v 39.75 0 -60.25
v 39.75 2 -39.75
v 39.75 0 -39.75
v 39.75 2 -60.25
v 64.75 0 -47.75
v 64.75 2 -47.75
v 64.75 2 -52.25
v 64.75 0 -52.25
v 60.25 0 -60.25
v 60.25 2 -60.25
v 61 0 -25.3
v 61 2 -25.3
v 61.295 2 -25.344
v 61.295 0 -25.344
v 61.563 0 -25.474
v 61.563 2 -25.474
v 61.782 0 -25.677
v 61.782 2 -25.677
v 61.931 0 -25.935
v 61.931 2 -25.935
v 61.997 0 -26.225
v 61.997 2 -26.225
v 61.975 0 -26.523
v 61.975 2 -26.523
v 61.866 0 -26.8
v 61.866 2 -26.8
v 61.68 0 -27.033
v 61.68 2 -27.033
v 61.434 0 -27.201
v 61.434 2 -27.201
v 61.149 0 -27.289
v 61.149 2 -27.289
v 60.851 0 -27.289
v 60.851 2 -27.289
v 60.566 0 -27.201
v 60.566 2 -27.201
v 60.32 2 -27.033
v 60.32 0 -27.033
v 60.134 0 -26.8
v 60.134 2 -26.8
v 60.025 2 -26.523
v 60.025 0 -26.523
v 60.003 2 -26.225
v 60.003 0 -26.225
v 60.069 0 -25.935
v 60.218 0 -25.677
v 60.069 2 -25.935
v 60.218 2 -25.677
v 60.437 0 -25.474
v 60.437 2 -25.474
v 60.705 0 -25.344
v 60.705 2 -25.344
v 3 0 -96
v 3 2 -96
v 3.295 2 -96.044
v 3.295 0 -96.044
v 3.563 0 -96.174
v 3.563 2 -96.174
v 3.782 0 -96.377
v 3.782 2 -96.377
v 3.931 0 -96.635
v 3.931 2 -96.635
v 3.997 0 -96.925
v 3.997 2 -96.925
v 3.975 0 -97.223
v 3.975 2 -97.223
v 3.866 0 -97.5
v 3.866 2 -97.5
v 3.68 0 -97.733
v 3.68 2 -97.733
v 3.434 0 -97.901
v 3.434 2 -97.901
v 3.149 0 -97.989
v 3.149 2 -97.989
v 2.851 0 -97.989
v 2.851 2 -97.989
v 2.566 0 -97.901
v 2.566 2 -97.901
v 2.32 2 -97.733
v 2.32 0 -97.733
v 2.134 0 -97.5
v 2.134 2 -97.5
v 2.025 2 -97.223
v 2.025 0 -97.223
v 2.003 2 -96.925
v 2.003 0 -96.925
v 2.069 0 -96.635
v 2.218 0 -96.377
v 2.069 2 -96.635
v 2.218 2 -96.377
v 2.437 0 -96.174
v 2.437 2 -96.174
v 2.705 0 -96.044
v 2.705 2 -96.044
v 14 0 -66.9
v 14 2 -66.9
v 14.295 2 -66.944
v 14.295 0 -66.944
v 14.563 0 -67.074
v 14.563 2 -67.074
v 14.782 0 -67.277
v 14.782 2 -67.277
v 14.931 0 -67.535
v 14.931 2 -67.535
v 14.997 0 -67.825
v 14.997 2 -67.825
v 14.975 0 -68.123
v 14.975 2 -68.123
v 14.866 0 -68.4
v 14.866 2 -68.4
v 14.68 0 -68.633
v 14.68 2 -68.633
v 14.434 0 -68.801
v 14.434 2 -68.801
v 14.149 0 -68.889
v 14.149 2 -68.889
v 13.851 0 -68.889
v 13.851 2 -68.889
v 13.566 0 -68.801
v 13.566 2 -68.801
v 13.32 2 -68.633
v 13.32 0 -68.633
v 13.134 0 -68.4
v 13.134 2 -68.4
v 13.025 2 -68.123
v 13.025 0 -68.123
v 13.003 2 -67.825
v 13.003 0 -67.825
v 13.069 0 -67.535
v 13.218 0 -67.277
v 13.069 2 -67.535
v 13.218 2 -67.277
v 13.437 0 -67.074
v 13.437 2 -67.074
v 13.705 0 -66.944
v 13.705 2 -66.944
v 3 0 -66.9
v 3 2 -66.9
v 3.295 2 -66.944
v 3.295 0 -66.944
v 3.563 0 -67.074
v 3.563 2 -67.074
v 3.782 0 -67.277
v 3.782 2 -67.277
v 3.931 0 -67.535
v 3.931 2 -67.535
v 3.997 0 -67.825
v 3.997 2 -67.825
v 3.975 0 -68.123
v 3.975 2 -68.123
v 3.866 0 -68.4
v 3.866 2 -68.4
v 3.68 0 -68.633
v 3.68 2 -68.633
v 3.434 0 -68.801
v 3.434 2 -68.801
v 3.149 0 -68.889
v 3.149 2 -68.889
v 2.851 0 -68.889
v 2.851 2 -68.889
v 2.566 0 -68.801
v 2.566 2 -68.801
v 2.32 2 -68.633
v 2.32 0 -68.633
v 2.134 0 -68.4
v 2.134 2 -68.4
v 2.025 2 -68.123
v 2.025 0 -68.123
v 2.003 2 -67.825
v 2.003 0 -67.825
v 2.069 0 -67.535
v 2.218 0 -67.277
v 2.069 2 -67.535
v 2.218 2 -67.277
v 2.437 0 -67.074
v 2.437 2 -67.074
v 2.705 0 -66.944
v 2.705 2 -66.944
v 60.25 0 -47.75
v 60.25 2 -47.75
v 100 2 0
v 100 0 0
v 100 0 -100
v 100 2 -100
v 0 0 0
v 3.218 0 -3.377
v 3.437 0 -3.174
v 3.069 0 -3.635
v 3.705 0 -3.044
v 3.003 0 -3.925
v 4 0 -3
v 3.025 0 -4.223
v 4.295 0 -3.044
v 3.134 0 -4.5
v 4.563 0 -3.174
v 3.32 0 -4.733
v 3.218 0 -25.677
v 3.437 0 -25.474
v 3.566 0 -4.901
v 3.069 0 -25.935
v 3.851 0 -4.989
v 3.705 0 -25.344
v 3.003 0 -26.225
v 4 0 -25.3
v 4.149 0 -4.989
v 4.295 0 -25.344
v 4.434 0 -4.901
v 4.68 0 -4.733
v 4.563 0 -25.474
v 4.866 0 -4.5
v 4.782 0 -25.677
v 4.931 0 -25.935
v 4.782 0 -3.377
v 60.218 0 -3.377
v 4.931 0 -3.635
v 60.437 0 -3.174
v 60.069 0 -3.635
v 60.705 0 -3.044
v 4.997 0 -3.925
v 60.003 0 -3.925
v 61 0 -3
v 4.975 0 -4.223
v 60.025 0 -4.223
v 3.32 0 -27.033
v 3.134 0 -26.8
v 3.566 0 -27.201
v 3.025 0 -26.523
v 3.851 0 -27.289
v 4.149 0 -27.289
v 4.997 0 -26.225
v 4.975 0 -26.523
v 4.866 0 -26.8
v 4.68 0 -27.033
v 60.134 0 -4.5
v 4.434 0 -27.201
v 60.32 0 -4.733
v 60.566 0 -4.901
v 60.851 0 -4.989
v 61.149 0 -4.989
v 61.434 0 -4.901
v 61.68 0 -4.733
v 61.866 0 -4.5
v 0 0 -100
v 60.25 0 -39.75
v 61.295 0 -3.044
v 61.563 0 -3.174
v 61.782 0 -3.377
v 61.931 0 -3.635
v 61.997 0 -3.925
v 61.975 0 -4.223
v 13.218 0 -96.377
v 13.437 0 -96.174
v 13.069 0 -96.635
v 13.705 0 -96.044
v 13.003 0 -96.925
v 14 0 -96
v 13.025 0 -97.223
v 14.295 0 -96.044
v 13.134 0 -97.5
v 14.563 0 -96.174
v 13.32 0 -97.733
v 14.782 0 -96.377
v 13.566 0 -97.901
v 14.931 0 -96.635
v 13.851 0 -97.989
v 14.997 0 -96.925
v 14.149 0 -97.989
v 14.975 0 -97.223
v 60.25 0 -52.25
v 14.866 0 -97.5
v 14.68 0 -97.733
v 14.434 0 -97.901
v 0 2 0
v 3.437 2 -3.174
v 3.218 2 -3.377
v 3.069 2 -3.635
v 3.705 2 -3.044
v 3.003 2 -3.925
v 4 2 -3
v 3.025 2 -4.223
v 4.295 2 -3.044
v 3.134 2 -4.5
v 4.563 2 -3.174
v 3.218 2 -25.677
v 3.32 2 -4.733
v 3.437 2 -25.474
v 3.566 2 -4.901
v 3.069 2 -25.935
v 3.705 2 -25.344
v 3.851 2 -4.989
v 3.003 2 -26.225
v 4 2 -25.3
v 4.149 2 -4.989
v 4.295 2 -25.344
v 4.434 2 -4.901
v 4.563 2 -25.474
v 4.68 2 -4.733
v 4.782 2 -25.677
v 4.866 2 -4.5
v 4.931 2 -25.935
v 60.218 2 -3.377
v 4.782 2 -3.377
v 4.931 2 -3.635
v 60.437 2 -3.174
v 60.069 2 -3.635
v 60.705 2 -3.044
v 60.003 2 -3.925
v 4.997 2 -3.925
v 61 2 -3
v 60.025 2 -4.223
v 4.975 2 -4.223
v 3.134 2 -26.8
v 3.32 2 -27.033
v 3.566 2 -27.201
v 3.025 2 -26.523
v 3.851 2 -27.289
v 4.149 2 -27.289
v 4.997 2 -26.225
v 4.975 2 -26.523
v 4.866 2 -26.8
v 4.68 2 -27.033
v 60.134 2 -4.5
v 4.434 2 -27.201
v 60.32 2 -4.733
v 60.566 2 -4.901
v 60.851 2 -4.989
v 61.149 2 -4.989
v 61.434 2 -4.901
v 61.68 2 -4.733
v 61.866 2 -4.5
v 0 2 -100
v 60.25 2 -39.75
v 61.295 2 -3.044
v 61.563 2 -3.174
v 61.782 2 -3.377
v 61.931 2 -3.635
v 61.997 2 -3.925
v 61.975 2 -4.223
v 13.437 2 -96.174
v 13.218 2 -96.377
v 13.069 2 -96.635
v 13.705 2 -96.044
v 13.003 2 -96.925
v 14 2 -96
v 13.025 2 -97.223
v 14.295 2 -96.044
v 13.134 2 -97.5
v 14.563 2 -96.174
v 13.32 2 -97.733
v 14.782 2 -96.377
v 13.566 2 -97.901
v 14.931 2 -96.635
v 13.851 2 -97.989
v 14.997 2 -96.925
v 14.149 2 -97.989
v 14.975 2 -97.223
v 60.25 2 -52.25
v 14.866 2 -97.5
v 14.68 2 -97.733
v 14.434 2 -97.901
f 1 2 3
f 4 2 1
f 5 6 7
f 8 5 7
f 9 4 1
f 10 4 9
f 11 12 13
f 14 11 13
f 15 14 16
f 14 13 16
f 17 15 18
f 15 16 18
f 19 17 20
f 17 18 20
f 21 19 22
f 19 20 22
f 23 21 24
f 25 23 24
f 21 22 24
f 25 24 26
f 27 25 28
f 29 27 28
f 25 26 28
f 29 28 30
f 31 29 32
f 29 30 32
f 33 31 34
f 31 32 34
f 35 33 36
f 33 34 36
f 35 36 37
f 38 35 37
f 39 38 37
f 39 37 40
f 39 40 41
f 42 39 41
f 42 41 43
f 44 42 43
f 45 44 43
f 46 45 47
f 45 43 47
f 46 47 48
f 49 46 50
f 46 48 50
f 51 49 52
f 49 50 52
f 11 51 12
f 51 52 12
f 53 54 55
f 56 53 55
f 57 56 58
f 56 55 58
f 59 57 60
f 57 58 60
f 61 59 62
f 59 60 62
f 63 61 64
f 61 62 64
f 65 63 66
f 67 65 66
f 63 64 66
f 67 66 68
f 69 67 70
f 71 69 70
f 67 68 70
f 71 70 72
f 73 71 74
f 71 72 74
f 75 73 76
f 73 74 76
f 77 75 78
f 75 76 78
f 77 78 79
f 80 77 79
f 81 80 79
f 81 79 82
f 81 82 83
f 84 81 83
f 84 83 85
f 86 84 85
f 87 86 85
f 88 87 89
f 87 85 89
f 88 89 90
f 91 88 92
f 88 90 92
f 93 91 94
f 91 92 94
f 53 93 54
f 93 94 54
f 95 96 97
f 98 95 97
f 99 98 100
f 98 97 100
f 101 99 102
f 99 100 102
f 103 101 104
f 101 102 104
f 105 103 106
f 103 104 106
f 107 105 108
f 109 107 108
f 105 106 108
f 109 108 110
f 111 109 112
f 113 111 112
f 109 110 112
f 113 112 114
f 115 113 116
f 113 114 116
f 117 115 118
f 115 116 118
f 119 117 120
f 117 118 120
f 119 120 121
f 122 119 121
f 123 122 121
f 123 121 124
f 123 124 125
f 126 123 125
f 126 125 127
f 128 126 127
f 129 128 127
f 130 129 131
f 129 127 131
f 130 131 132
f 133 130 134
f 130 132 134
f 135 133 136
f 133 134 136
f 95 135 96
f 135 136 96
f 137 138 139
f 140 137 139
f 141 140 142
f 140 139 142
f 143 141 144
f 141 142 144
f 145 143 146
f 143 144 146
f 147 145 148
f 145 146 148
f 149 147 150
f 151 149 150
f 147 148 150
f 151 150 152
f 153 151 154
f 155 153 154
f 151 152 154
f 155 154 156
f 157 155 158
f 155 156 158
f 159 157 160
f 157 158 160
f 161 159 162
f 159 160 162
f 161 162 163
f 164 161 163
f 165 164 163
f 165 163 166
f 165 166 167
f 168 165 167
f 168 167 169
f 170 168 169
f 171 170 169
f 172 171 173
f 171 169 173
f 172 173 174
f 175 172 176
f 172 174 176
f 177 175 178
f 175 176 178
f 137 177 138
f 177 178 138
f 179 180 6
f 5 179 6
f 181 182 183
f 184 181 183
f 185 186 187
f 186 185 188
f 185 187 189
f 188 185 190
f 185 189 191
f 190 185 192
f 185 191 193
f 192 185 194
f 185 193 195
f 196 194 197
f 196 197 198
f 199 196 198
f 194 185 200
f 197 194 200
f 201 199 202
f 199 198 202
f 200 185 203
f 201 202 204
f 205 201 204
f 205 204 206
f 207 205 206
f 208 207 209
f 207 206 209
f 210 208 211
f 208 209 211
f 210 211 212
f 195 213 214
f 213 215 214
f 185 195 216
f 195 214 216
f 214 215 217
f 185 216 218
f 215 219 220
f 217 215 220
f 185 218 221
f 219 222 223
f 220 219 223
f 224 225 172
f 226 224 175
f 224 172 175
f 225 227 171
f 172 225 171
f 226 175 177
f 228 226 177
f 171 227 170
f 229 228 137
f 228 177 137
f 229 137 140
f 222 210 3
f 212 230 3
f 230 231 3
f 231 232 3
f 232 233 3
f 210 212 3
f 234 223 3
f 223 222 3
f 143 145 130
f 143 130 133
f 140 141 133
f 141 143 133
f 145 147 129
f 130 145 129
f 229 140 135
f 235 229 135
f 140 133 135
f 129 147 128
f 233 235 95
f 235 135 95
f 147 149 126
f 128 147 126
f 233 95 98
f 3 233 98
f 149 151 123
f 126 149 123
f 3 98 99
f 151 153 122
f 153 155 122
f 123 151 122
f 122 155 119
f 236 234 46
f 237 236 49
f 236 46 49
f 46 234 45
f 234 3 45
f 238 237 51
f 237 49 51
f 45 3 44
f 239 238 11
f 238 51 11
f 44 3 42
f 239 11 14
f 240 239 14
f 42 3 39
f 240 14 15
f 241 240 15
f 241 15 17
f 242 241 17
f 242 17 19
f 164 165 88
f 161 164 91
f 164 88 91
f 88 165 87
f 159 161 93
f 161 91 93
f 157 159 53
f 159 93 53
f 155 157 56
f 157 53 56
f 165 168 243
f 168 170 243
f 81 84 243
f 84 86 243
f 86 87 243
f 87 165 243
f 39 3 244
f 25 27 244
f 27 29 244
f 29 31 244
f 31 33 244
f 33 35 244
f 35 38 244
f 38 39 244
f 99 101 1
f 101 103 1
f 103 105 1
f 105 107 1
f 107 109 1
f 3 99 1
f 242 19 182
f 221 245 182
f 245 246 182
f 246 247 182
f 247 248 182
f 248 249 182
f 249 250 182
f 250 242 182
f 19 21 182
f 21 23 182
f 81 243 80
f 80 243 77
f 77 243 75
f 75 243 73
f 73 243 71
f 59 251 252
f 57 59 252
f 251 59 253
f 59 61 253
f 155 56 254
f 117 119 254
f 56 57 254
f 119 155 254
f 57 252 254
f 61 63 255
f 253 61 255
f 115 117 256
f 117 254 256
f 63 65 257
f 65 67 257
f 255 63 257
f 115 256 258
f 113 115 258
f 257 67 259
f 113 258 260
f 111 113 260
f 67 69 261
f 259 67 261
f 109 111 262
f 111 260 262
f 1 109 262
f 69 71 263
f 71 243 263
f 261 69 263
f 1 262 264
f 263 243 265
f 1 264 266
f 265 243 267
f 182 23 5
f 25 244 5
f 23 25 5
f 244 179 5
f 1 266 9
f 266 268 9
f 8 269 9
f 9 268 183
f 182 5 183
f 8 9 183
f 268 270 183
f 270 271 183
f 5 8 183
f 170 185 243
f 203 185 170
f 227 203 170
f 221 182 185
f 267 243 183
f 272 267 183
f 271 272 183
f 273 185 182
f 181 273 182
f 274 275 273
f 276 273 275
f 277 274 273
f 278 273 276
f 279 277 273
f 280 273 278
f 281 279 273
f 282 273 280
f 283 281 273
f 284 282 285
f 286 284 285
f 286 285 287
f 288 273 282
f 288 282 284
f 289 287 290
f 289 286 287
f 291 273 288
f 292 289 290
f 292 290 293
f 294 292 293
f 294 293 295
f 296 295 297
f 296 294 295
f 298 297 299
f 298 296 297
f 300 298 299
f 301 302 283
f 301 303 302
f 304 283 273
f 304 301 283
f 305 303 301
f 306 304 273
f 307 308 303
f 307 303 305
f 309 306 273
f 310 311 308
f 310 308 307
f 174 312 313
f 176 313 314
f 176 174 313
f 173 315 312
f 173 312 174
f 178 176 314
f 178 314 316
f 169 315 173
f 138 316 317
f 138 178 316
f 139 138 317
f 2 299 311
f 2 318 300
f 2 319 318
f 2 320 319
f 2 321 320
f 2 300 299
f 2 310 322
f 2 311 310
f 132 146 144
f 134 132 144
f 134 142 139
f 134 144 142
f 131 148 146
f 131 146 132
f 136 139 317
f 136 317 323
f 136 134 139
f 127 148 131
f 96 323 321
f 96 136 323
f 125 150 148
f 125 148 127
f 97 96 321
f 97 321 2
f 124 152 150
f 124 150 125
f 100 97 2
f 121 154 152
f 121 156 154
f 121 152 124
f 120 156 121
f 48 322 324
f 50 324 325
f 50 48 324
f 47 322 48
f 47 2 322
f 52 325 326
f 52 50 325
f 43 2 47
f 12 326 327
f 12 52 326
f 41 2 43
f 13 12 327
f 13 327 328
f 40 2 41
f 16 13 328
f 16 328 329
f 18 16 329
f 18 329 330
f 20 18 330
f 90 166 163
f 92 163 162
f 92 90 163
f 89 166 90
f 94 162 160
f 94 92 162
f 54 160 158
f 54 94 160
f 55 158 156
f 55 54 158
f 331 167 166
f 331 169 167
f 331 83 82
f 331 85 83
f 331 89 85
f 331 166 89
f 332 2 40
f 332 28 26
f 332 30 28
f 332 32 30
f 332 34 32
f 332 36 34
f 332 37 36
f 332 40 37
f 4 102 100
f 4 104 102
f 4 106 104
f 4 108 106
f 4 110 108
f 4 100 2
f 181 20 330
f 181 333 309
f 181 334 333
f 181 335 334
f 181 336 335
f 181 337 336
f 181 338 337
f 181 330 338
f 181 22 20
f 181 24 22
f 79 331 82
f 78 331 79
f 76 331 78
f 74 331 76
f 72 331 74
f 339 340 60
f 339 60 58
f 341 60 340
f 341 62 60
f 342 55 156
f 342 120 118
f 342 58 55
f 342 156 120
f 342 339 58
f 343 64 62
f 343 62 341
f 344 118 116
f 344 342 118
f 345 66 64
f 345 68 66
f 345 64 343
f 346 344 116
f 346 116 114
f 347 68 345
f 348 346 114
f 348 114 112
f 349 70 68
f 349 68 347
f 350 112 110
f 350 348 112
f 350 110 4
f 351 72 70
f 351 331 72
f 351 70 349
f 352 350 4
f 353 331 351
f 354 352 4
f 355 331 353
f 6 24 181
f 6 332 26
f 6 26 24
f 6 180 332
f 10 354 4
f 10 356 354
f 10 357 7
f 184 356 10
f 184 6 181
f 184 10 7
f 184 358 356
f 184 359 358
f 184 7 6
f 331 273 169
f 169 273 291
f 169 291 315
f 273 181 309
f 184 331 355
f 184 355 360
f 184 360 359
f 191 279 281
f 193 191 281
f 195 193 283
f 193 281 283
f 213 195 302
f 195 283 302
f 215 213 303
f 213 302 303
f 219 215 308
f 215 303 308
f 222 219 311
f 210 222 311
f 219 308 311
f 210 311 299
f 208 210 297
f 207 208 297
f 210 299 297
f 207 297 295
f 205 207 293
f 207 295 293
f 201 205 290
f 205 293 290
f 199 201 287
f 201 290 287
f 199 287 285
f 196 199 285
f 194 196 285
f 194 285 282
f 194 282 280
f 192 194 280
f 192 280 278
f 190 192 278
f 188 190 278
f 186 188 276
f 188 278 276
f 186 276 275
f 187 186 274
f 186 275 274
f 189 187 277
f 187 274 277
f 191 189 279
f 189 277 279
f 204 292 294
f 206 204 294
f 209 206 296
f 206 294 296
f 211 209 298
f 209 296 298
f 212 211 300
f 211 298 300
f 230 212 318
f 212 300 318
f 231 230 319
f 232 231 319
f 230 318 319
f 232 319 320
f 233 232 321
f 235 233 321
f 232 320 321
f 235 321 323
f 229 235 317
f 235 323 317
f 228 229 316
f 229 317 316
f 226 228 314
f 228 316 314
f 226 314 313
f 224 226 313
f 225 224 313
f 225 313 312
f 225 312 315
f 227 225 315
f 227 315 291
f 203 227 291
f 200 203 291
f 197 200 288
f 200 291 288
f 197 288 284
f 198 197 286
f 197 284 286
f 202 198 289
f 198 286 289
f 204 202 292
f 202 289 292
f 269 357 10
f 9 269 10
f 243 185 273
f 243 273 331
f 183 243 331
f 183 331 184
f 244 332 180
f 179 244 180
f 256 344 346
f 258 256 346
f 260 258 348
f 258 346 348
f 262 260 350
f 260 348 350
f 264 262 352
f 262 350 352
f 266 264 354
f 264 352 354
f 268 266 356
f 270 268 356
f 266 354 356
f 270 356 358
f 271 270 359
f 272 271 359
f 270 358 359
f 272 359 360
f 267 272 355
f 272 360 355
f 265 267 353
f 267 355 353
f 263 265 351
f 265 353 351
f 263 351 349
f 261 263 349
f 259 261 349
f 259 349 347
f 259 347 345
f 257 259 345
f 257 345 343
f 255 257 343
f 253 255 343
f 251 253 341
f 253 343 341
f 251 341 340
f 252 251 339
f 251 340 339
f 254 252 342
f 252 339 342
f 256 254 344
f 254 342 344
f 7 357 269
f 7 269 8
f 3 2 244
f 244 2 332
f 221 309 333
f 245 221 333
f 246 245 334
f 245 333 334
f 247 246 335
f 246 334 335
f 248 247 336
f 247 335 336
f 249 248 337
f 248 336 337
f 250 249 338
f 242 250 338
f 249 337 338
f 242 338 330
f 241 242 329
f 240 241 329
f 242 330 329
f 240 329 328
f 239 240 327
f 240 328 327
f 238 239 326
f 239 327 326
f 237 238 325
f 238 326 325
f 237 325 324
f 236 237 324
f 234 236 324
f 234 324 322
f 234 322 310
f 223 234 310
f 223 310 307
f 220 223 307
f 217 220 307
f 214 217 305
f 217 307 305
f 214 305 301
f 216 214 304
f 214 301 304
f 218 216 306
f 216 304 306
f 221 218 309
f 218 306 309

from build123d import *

# Parameters (mm, degrees)
SKETCH1_W                          = 100
SKETCH1_H                          = 100
BOSS_EXTRUDE1_DEPTH                = 2
SKETCH3_W                          = 20.5
SKETCH3_H                          = 20.5
SKETCH3_W_2                        = 4.5
SKETCH3_H_2                        = 4.5
CUT_PEG_HOLE_DEPTH                 = 2
SKETCH4_R                          = 1
CUT_RASPBERRY_PI_SCREW_HOLES_DEPTH = 2
SKETCH5_R                          = 1
CUT_ATHEROS_SCREW_HOLES_DEPTH      = 2


with BuildPart() as part:
    # Sketch1 → Boss-Extrude1 (new body)
    with BuildSketch(Plane(origin=(0, 0, 0), x_dir=(1, 0, 0), z_dir=(0, 1, 0))):
        with Locations((50, 50)):
            Rectangle(SKETCH1_W, SKETCH1_H)
    extrude(amount=BOSS_EXTRUDE1_DEPTH)

    # Sketch3 → Cut - Peg Hole (cut)
    with BuildSketch(Plane(origin=(0, 2, 0), x_dir=(1, 0, 0), z_dir=(0, 1, 0))):
        with Locations((50, 50)):
            Rectangle(SKETCH3_W, SKETCH3_H)
        with Locations((62.5, 50)):
            Rectangle(SKETCH3_W_2, SKETCH3_H_2)
    extrude(amount=-CUT_PEG_HOLE_DEPTH, mode=Mode.SUBTRACT)

    # Sketch4 → Cut - Raspberry Pi Screw Holes (cut)
    with BuildSketch(Plane(origin=(0, 2, 0), x_dir=(1, 0, 0), z_dir=(0, 1, 0))):
        with Locations(Location((4, 26.3, 0), (0, 0, 270))):
            Circle(SKETCH4_R)
        with Locations(Location((4, 4, 0), (0, 0, 270))):
            Circle(SKETCH4_R)
        with Locations(Location((61, 26.3, 0), (0, 0, 270))):
            Circle(SKETCH4_R)
        with Locations(Location((61, 4, 0), (0, 0, 270))):
            Circle(SKETCH4_R)
    extrude(amount=-CUT_RASPBERRY_PI_SCREW_HOLES_DEPTH, mode=Mode.SUBTRACT)

    # Sketch5 → Cut - Atheros Screw Holes (cut)
    with BuildSketch(Plane(origin=(0, 2, 0), x_dir=(1, 0, 0), z_dir=(0, 1, 0))):
        with Locations(Location((3, 67.9, 0), (0, 0, 270))):
            Circle(SKETCH5_R)
        with Locations(Location((14, 67.9, 0), (0, 0, 270))):
            Circle(SKETCH5_R)
        with Locations(Location((14, 97, 0), (0, 0, 270))):
            Circle(SKETCH5_R)
        with Locations(Location((3, 97, 0), (0, 0, 270))):
            Circle(SKETCH5_R)
    extrude(amount=-CUT_ATHEROS_SCREW_HOLES_DEPTH, mode=Mode.SUBTRACT)


solid = part.part
